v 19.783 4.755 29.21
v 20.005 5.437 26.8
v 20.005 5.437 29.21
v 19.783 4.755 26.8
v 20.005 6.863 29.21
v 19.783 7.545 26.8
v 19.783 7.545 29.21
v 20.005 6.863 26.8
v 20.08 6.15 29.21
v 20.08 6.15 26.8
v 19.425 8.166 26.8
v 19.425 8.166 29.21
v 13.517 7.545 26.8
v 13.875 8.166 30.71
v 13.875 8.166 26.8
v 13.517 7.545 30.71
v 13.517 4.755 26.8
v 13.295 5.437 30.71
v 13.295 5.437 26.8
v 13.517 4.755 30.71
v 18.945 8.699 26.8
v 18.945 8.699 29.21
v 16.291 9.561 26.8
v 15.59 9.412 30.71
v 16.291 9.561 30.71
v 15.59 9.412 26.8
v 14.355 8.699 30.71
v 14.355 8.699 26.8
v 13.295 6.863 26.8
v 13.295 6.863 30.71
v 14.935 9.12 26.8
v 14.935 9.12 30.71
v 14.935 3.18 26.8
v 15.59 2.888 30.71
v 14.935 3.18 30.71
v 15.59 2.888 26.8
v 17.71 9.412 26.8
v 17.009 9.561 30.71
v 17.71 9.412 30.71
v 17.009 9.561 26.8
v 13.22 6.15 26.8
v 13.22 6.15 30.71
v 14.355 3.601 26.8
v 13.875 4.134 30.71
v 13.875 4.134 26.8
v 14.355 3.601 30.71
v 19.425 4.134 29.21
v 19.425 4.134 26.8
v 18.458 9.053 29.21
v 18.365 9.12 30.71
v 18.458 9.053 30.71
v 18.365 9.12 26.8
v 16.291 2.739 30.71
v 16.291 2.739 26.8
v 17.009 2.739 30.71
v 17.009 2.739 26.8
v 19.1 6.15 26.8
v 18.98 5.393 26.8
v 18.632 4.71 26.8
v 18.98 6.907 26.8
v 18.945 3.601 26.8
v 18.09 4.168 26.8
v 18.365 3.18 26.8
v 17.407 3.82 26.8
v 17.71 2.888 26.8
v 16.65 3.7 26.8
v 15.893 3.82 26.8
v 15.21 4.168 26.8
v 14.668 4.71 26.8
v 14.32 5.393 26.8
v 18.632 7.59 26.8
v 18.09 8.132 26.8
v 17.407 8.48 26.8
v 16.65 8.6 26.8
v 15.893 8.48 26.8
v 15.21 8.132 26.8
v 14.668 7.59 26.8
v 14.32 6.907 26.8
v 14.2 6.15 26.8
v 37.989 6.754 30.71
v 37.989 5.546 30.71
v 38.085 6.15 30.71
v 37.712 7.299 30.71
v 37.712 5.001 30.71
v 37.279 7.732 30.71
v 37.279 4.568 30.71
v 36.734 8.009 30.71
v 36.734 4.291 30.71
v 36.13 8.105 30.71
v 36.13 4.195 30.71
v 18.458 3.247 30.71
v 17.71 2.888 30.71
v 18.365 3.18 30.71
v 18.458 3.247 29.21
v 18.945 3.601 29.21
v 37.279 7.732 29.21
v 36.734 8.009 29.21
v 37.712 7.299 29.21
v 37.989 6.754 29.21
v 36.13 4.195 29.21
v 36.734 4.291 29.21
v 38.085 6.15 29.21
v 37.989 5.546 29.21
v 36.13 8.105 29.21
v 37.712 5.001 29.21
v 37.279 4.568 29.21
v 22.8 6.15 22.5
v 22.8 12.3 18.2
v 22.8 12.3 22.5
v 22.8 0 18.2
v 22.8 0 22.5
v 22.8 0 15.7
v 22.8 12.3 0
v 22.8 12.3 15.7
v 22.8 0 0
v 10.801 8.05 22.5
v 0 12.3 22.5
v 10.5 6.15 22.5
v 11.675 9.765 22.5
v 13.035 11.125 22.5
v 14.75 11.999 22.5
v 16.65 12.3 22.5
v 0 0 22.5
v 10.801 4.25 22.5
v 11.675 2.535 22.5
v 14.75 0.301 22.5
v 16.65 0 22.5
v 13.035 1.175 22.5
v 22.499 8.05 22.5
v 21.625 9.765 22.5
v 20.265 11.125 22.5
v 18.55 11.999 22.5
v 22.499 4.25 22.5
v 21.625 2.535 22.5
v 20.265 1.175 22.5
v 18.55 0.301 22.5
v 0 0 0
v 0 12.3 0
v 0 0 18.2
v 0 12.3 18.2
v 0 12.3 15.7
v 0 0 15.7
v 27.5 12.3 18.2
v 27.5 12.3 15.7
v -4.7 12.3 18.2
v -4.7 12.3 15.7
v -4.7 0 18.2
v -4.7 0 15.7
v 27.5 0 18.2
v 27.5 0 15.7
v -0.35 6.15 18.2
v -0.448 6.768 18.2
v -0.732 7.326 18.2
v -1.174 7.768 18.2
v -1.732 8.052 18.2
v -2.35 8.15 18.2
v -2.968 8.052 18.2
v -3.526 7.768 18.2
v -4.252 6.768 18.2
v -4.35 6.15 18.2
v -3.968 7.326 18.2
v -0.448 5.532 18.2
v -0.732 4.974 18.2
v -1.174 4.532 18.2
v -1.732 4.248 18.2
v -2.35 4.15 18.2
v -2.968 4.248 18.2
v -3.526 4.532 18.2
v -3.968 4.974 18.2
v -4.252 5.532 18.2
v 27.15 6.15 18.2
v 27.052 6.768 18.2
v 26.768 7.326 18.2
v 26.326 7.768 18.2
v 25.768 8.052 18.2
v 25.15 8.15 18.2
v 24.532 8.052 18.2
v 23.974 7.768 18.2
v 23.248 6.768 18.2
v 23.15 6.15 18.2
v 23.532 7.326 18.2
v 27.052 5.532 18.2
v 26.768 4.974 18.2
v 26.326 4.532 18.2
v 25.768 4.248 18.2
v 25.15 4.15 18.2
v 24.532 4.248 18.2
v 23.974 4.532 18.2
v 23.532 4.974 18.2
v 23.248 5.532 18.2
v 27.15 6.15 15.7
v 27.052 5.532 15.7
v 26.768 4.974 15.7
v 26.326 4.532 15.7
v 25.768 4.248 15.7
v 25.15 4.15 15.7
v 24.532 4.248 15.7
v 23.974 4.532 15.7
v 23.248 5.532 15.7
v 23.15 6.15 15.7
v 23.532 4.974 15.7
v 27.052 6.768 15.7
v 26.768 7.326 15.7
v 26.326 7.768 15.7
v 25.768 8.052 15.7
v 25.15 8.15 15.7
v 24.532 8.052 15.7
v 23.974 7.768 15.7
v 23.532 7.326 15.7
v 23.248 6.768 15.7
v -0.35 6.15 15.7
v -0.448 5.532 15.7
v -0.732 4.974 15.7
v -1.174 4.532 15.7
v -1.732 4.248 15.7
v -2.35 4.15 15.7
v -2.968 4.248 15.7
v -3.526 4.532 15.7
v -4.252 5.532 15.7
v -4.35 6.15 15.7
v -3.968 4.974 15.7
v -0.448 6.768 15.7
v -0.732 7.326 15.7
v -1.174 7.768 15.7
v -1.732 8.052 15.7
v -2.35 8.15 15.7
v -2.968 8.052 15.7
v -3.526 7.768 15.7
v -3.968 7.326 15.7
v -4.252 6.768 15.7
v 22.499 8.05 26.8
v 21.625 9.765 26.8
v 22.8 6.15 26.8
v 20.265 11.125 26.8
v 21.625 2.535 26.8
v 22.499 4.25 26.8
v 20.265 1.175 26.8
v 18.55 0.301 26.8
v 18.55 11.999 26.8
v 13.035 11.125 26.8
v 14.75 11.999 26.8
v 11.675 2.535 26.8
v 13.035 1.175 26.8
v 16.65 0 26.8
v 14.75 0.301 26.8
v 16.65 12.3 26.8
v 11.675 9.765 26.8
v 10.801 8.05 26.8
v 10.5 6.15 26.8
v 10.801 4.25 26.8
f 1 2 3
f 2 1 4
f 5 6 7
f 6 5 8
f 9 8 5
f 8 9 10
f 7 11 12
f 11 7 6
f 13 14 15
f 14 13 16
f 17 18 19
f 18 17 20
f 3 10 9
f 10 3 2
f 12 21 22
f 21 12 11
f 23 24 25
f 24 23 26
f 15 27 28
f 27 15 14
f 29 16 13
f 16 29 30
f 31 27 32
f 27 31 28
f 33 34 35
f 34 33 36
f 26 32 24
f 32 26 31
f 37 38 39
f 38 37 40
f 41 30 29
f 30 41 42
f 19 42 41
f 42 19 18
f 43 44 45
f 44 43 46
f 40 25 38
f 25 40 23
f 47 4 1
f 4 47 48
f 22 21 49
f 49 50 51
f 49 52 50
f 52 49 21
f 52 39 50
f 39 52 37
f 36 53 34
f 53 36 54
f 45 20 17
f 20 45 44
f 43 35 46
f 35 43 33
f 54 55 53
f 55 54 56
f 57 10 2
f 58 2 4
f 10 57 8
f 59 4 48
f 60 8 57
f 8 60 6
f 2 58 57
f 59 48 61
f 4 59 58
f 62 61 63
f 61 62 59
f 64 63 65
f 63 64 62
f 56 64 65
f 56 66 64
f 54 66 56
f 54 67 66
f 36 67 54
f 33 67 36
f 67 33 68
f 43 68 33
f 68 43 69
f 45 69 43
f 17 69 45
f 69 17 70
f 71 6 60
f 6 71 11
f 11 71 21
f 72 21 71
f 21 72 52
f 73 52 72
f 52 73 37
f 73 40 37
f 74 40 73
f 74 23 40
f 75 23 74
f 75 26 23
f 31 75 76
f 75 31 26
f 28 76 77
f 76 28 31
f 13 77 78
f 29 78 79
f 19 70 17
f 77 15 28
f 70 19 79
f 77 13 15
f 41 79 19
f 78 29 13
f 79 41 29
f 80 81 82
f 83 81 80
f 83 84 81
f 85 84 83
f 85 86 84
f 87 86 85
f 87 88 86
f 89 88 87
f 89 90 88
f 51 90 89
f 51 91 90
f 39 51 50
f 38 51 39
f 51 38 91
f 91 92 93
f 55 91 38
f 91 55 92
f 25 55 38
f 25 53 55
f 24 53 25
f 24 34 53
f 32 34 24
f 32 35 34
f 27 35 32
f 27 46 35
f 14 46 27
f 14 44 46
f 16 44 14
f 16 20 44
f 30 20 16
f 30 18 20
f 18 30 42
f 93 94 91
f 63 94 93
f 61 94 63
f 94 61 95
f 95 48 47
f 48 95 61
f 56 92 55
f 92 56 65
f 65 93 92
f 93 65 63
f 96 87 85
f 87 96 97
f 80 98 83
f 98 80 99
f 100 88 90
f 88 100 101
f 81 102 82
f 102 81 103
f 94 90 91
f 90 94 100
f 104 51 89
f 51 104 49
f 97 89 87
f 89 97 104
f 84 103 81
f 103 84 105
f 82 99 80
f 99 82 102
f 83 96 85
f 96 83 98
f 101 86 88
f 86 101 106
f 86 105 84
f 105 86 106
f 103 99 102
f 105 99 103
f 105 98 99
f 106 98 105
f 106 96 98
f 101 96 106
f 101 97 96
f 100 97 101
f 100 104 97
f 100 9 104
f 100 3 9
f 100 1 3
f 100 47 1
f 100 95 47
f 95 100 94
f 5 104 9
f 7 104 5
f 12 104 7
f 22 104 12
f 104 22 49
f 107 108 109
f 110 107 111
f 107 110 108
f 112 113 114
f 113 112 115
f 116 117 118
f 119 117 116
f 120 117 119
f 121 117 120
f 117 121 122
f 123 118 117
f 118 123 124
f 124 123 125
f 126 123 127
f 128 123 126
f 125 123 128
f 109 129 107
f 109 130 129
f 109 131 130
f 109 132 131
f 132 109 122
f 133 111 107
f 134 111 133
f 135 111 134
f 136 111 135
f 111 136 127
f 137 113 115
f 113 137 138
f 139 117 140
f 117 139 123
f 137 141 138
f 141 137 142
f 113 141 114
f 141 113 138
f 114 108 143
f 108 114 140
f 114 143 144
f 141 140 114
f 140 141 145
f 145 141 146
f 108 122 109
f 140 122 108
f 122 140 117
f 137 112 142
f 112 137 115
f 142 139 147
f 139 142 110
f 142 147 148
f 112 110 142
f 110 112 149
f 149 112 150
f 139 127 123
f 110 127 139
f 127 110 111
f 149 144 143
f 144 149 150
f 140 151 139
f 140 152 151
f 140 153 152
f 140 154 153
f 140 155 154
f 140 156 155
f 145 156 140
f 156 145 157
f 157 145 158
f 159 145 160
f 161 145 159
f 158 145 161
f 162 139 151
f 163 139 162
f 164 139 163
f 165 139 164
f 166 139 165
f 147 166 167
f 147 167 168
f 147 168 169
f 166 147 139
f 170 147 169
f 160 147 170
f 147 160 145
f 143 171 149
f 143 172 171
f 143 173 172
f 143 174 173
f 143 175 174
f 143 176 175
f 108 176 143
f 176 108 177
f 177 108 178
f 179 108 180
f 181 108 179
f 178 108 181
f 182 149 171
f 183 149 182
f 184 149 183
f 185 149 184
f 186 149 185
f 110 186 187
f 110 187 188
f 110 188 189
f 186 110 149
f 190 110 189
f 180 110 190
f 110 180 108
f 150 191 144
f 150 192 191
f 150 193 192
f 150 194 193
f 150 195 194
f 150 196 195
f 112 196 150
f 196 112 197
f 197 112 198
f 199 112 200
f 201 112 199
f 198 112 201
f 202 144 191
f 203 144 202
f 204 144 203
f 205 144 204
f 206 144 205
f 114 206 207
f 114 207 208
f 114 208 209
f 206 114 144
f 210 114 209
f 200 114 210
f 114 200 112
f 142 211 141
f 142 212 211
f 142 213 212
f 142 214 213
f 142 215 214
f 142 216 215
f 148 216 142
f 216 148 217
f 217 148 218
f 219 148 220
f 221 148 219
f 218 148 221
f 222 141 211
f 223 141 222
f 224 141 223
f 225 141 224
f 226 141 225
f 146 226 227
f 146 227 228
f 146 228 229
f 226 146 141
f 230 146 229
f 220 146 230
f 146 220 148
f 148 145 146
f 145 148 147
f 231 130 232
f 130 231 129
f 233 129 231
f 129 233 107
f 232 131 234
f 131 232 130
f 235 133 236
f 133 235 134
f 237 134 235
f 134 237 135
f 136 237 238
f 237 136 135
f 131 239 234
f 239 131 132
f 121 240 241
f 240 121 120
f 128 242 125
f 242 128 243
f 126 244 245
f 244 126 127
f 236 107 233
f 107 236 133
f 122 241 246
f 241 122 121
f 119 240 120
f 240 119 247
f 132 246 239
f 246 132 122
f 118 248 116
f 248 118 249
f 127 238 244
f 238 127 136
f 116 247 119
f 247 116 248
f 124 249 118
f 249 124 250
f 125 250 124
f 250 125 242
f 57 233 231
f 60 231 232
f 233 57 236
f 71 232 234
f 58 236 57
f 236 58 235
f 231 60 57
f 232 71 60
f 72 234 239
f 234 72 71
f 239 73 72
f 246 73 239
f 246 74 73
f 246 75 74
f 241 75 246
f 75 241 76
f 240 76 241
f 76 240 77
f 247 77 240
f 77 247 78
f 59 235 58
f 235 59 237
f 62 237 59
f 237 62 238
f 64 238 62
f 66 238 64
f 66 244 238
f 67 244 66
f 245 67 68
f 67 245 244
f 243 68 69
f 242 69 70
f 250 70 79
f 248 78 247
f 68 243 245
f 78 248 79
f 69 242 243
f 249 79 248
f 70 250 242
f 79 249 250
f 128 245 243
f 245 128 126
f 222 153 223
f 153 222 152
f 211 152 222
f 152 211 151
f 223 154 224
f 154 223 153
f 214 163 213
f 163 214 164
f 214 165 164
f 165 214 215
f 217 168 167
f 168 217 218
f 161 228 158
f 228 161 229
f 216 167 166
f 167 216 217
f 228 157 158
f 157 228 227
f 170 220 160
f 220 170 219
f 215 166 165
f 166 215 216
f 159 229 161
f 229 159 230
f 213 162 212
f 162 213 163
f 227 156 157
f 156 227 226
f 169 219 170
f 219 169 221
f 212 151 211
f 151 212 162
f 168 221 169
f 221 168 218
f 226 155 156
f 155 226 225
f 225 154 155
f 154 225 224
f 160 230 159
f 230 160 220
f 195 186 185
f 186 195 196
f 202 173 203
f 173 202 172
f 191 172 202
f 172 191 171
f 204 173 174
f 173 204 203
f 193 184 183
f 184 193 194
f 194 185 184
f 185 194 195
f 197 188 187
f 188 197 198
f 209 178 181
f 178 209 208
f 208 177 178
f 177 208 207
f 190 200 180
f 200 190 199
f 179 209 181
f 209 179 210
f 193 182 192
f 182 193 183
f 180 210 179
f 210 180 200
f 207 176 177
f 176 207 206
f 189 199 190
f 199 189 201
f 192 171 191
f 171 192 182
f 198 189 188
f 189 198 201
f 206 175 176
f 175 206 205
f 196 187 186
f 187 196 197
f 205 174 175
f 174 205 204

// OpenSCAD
// file: vitamins/servo_joint.scad
function servo_joint_tab(spec) = spec[0];
function servo_joint_connector(spec) = spec[1];
function servo_joint_tab_length(spec) = servo_joint_tab(spec)[0];
function servo_joint_tab_thickness(spec) = servo_joint_tab(spec)[1];
function servo_joint_tab_radius(spec) = servo_joint_tab(spec)[2];
function servo_joint_connector_height(spec) = servo_joint_connector(spec)[0];
function servo_joint_connector_radius(spec) = servo_joint_connector(spec)[1];

module servo_joint1(spec) {
    // Tab
    tab_length = servo_joint_tab_length(spec);
    tab_thickness = servo_joint_tab_thickness(spec);
    tab_radius = servo_joint_tab_radius(spec);

    conn_height = servo_joint_connector_height(spec);
    conn_radius = servo_joint_connector_radius(spec);

    union() {
        color("white") cylinder(r=conn_radius, h=conn_height, $fn=30);

        translate([0, 0, conn_height - tab_thickness])
            color("white")
            hull() {
                cylinder(r=tab_radius[0], h=tab_thickness, $fn=20);
                translate([tab_length, 0, 0]) cylinder(r=tab_radius[1], h=tab_thickness, $fn=20);
            }
    }
}
// file: vitamins/servo.scad
function servo_base_dims(spec) = spec[0];
function servo_base_dim_x(spec) = servo_base_dims(spec)[0];
function servo_base_dim_y(spec) = servo_base_dims(spec)[1];
function servo_base_dim_z(spec) = servo_base_dims(spec)[2];
function servo_screw_bar_dims(spec) = spec[1];
function servo_screw_bar_dims_x(spec) = servo_screw_bar_dims(spec)[0];
function servo_screw_bar_dims_y(spec) = servo_screw_bar_dims(spec)[1];
function servo_screw_bar_dims_z(spec) = servo_screw_bar_dims(spec)[2];
function servo_screw_bar_offset(spec) = [-(servo_screw_bar_dims_x(spec) - servo_base_dim_x(spec)) / 2, 0, 18.2 - 2.5];
function servo_column_radius(spec) = servo_base_dim_y(spec) / 2;
function servo_column_height(spec) = spec[2];
function servo_axiel_radius(spec) = spec[3];
function servo_axiel_height(spec) = spec[4];
function servo_axiel_offset(spec) = [servo_base_dim_x(spec) - servo_base_dim_y(spec) / 2, servo_base_dim_y(spec) / 2];
function servo_screw_hole_radius(spec) = spec[5];
// function servo_screw_hole_distance(spec) = spec[6];
function servo_screw_hole_positions(spec) = [[servo_base_dim_x(spec) / 2 - 13.75, servo_base_dim_y(spec) / 2], [servo_base_dim_x(spec) / 2 + 13.75, servo_base_dim_y(spec) / 2]];


module servo(spec) {
    base_dims = servo_base_dims(spec);
    screw_bar_dims = servo_screw_bar_dims(spec);
    screw_bar_offset = servo_screw_bar_offset(spec);

    column_radius = servo_column_radius(spec);
    column_height = servo_column_height(spec);
    column_offset = [base_dims[0] - column_radius, base_dims[1] / 2, 0];

    axiel_radius = servo_axiel_radius(spec);
    axiel_height = servo_axiel_height(spec);

    screw_hole_radius = servo_screw_hole_radius(spec);
    // screw_hole_distance = servo_screw_hole_distance(spec);

    difference() {
        union() {
            color("blue") cube(base_dims);
            color("blue") translate(screw_bar_offset) cube(screw_bar_dims);
            color("blue") translate(column_offset) cylinder(r=column_radius, h=column_height, $fn=20);
            color("white") translate(column_offset) cylinder(r=axiel_radius, h=axiel_height, $fn=20);
        }

        for (p = servo_screw_hole_positions(spec)) {
            translate([p[0], p[1]]) {
                cylinder(r=screw_hole_radius, h=column_height, $fn=20);
                // # translate([0, 0, screw_bar_offset[2]]) cube(size=[1, 1, 1], center=true);
            }
        }
    }
}
// file: vitamins/servo_joints.scad
SG90_JOINT1 = [
    // Tab
    [
        // Length
        19.48,
        // Thickness
        1.5,
        // Radius' (big side, then small)
        [3, 3.91/2]
    ],
    // Connector
    [
        // Height
        3.91,
        // Radius
        6.86 / 2
    ]
];

use <servo_joint.scad>
// file: vitamins/servos.scad
SG90 = [
    // Base dimensions
    [22.8, 12.3, 22.5],
    // Screw bar (???) dimensions
    [32.2, 12.3, 2.5],
    // Column height above base
    30.0 - 3.2,
    // Axiel radius
    4.9 / 2,
    // Axiel height
    30.0,
    // Screw hole radius
    2.0,
    // Screw hole from each other
    // 27.5
];

use <servo.scad>
// main file
include <vitamins/servos.scad>
include <vitamins/servo_joints.scad>

servo = SG90;

axiel_offset = servo_axiel_offset(servo);

translate([axiel_offset[0], axiel_offset[1], servo_column_height(servo)]) {
    servo_joint1(SG90_JOINT1);
}

servo(servo);
